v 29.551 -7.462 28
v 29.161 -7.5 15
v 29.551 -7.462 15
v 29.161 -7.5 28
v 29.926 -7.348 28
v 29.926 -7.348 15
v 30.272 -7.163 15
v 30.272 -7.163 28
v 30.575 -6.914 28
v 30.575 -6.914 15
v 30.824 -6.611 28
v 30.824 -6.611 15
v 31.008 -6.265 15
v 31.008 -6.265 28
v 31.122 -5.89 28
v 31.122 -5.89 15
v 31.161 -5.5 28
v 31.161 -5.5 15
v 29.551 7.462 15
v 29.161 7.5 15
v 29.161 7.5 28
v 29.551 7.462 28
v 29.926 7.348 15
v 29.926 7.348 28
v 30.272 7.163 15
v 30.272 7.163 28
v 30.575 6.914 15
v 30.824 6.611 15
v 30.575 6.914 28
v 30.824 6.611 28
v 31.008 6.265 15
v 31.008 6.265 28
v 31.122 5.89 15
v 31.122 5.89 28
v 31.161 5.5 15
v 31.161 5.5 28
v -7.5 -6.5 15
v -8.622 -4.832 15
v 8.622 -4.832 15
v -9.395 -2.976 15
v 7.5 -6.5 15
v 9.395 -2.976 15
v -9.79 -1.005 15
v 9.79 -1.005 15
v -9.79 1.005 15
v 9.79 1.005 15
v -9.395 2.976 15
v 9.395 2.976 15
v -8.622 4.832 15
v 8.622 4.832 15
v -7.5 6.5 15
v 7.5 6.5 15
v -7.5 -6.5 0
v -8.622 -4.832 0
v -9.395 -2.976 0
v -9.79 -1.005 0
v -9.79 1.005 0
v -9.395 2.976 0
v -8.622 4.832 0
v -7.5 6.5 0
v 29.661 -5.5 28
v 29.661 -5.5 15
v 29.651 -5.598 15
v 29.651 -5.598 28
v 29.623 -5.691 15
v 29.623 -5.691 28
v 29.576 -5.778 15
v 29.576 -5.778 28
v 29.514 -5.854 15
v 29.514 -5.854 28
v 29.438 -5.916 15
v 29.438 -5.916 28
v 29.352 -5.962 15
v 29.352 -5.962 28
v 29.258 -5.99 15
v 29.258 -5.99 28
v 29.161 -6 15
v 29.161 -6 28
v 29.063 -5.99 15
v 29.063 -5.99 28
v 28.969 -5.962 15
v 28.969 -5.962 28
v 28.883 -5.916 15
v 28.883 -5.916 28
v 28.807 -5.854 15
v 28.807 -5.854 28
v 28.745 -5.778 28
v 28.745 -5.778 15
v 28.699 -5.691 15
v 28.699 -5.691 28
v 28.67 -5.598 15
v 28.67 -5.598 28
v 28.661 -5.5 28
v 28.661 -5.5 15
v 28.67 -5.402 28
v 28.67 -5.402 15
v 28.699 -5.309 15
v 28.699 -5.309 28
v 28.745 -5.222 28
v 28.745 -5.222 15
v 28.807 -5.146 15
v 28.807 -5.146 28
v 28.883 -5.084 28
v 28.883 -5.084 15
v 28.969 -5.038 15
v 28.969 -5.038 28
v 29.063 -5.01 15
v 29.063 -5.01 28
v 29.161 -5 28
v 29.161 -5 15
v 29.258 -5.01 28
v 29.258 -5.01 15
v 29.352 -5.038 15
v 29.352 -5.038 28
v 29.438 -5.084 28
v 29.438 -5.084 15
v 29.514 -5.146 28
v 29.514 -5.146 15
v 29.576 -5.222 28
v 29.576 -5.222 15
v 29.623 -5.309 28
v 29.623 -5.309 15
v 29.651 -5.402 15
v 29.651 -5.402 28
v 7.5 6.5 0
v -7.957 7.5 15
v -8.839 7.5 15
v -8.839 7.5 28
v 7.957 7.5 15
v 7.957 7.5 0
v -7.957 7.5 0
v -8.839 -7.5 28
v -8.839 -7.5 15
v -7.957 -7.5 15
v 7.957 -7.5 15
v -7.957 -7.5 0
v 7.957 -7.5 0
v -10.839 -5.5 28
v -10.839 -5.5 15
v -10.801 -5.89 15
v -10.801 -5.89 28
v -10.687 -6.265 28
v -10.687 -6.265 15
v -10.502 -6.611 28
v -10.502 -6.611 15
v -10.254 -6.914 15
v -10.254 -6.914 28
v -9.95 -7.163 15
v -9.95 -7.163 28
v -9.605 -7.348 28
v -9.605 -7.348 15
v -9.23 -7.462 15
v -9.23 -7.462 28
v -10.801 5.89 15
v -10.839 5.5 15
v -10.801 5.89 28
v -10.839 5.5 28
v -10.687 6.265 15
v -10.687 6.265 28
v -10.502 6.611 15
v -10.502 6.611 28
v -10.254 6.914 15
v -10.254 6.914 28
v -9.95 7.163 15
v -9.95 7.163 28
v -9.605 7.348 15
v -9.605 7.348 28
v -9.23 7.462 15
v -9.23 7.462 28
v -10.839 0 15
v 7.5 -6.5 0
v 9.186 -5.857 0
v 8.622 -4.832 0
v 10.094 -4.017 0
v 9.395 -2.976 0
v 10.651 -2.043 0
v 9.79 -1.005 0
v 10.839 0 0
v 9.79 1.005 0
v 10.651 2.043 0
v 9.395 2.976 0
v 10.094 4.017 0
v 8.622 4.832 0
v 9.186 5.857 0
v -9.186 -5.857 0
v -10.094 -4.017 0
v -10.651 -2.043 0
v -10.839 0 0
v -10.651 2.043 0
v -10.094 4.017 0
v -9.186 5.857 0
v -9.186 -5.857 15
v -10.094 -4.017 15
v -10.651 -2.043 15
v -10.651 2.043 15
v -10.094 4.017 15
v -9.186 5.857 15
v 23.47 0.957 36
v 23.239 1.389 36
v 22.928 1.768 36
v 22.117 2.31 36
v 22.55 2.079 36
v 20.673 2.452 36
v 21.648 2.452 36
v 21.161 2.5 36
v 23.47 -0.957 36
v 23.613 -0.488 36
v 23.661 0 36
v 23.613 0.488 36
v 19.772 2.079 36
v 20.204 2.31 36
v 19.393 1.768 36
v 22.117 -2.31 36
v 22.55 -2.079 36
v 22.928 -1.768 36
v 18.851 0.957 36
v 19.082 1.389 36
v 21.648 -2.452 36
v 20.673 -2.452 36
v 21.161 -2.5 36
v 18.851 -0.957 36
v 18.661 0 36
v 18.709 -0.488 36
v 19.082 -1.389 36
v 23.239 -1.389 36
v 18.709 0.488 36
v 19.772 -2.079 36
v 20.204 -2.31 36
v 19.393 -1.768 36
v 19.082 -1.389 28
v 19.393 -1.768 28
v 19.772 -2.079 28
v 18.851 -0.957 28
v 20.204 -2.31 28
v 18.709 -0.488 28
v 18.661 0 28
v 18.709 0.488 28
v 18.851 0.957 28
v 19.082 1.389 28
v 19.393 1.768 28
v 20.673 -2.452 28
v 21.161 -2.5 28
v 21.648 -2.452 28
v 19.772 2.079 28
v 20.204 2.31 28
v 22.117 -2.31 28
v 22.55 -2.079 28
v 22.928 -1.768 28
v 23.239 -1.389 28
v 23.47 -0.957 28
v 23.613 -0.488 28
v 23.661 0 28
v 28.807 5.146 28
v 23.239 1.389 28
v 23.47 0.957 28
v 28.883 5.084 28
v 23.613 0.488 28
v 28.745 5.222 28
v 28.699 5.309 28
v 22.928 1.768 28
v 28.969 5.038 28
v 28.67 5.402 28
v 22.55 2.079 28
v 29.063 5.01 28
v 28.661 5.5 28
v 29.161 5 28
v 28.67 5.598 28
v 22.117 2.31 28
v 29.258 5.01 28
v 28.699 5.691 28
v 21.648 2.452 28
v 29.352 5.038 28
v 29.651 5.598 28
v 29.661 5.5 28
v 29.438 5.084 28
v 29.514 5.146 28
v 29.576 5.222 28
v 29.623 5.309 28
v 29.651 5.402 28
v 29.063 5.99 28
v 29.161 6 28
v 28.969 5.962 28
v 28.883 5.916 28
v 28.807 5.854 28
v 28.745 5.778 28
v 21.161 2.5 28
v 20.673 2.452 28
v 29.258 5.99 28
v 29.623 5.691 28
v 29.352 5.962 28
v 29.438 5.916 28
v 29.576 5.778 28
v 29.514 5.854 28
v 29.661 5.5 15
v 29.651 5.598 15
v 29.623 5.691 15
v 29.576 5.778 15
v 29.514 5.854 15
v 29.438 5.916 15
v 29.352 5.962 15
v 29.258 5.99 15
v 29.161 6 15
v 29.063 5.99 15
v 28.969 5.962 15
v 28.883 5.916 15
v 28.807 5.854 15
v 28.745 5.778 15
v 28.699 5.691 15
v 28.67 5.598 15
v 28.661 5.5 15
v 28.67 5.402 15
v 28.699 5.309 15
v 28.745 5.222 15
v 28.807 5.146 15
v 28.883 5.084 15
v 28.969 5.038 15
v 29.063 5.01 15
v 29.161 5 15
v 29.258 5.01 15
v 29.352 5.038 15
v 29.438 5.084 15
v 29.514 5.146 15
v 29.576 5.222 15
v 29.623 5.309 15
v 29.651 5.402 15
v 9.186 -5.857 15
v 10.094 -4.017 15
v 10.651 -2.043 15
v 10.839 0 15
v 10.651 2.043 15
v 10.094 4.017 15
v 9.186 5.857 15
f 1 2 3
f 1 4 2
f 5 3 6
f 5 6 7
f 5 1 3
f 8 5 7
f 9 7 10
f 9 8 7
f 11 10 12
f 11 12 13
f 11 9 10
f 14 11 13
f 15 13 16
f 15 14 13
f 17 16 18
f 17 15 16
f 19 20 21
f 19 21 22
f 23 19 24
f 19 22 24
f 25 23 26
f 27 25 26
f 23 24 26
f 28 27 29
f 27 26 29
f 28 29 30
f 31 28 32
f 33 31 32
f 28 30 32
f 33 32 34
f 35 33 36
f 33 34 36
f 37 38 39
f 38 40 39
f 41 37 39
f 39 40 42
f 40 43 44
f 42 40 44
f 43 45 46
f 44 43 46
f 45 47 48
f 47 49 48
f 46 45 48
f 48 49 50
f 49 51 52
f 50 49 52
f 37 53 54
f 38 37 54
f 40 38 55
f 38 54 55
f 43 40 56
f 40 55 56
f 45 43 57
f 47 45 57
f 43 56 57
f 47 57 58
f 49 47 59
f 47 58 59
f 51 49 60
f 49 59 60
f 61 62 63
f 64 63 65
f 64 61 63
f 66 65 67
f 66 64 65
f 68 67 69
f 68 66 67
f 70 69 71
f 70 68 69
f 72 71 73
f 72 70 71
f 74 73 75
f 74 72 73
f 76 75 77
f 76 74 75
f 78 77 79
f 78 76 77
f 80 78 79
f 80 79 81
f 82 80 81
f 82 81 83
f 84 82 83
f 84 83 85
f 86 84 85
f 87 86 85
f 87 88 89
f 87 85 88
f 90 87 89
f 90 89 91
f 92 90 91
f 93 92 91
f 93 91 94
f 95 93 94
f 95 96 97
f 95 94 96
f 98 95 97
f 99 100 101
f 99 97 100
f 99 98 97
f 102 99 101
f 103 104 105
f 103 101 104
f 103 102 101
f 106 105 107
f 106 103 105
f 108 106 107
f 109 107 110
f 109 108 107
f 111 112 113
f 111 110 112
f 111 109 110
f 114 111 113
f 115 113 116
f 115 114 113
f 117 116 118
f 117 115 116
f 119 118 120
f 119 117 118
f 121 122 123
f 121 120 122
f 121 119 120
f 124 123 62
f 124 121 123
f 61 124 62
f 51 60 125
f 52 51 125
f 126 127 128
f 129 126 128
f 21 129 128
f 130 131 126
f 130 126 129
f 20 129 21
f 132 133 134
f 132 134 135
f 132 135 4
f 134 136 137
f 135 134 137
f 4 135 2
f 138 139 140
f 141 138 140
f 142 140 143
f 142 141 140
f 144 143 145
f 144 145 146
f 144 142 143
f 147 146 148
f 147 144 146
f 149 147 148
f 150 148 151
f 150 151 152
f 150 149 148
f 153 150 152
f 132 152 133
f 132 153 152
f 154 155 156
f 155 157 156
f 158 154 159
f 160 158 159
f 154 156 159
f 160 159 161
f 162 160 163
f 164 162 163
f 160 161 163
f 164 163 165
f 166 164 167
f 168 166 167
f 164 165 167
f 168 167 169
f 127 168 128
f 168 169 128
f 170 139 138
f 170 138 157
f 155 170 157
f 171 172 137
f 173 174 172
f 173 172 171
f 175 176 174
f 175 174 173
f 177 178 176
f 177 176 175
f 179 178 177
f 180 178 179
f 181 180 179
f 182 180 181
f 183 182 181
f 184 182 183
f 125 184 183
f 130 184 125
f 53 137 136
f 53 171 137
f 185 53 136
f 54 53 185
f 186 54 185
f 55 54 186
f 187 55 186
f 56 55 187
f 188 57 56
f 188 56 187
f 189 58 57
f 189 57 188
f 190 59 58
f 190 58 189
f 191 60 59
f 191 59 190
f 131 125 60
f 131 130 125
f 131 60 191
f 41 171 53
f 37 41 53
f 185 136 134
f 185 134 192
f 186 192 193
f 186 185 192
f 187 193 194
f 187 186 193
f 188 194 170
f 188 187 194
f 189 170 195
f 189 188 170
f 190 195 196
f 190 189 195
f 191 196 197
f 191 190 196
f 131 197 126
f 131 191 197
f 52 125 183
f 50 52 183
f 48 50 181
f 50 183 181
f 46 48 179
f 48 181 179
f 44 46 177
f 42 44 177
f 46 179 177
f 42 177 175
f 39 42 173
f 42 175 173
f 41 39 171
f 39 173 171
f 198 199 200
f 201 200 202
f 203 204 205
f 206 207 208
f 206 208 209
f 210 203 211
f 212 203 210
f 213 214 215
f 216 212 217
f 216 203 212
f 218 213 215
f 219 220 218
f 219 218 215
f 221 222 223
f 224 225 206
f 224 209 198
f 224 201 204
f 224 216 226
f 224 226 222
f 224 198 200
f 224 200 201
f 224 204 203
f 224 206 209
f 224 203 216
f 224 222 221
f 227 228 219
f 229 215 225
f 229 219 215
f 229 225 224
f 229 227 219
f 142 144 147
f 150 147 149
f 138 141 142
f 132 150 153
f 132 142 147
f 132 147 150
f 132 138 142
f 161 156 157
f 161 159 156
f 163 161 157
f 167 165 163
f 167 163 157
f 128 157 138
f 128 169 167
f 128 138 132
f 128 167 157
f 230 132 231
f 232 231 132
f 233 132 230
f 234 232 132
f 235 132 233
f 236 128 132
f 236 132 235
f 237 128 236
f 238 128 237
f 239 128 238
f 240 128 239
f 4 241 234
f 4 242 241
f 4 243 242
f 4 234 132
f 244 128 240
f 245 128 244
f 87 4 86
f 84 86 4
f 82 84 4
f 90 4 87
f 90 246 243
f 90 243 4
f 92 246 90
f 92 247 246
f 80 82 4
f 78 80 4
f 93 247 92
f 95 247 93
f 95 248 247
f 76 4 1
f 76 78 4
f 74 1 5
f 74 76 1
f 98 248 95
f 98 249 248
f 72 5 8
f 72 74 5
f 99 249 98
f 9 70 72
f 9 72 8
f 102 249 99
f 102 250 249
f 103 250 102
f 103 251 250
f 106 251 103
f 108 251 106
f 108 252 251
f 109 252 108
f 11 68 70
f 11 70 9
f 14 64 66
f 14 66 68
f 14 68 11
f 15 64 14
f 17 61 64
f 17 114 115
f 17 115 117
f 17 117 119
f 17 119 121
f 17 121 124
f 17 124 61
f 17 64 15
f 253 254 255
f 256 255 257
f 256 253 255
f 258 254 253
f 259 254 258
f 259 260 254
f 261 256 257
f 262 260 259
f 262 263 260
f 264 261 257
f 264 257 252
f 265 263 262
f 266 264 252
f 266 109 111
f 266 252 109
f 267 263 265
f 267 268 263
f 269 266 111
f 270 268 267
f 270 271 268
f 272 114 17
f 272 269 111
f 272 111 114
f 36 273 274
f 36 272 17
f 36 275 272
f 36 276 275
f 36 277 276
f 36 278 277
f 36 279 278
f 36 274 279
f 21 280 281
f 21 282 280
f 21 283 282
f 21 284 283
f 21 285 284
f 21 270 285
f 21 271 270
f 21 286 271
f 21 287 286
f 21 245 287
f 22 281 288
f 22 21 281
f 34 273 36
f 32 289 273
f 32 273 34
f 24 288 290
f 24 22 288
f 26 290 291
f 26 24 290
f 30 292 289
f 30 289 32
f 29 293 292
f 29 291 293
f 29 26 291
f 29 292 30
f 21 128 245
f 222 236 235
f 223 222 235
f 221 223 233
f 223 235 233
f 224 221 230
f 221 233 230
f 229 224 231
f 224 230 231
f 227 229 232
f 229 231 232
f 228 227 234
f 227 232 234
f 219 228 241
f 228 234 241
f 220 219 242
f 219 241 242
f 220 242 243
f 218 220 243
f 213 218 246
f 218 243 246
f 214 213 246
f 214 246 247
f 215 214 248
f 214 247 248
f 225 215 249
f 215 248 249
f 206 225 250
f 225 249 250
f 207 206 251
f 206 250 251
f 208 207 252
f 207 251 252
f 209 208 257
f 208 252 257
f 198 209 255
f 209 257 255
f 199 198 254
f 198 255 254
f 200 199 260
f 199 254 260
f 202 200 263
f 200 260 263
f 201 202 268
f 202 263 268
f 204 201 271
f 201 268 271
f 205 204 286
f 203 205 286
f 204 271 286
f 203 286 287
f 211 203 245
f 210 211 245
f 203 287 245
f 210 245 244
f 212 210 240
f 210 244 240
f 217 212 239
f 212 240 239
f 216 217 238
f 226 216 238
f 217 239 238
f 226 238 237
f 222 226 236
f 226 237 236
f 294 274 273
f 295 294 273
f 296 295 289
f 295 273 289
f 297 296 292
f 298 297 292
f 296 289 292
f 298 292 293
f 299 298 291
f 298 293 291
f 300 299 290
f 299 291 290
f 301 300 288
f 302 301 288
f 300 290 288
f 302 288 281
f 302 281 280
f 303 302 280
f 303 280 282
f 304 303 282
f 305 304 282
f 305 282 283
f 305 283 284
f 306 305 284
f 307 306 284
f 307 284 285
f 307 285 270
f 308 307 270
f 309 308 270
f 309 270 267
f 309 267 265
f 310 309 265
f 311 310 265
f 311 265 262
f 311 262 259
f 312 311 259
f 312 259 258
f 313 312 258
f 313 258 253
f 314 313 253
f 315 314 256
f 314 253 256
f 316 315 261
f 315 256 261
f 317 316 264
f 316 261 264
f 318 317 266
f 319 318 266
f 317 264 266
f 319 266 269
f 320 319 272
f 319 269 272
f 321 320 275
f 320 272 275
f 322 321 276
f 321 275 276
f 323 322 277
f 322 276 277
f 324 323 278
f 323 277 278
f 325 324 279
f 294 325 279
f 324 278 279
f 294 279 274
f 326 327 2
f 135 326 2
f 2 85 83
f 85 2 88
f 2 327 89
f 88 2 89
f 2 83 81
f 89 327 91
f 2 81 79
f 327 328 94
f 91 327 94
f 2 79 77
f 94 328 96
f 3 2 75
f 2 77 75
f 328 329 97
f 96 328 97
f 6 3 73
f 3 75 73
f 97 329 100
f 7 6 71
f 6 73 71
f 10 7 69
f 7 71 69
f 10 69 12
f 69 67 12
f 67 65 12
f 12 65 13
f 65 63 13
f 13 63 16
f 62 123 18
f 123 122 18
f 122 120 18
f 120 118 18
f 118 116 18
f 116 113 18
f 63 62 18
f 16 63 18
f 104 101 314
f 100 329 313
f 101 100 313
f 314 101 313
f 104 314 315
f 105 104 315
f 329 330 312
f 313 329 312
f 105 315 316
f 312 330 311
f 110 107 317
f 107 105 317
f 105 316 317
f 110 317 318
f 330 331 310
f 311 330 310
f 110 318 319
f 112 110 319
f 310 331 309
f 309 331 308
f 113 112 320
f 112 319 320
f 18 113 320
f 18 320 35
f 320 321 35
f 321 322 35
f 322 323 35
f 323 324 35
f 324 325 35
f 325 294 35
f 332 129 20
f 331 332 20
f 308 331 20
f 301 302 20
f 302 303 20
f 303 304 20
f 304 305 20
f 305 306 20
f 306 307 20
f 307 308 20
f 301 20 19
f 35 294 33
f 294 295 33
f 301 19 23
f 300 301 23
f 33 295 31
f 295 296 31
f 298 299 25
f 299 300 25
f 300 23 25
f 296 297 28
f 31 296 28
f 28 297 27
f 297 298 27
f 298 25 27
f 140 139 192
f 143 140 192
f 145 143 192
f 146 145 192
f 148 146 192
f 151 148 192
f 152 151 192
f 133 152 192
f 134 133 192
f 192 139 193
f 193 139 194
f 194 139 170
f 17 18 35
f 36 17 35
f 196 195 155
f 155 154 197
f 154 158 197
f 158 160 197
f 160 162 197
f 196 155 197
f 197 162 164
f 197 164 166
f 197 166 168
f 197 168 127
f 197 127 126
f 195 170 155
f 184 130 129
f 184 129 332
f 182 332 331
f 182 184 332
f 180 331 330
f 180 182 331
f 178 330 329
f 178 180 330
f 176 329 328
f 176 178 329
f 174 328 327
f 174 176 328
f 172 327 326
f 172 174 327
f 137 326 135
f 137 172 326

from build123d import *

# Parameters (mm, degrees)
BOSS_EXTRUDE1_DEPTH = 15
SKETCH2_W           = 42
SKETCH2_H           = 15
BOSS_EXTRUDE2_DEPTH = 13
FILLET1_R           = 2
SKETCH3_R           = 2.5
BOSS_EXTRUDE3_DEPTH = 8
SKETCH4_R           = 0.5
CUT_EXTRUDE1_DEPTH  = 43.558628129


with BuildPart() as part:
    # Sketch1 → Boss-Extrude1 (new body)
    with BuildSketch(Plane.XY):
        with BuildLine():
            ThreePointArc((7.957391107, 7.5), (10.83933845, 0), (7.957391107, -7.5))
            Line((7.957391107, -7.5), (-7.957391107, -7.5))
            ThreePointArc((-7.957391107, -7.5), (-10.83933845, 0), (-7.957391107, 7.5))
            Line((-7.957391107, 7.5), (7.957391107, 7.5))
        make_face()
        with BuildLine():
            Line((-7.5, 6.5), (7.5, 6.5))
            ThreePointArc((7.5, 6.5), (9.83933845, 0), (7.5, -6.5))
            Line((7.5, -6.5), (-7.5, -6.5))
            ThreePointArc((-7.5, -6.5), (-9.83933845, 0), (-7.5, 6.5))
        make_face(mode=Mode.SUBTRACT)
    extrude(amount=BOSS_EXTRUDE1_DEPTH)

    # Sketch2 → Boss-Extrude2 (add)
    with BuildSketch(Plane.XY.offset(15)):
        with Locations((10.16066155, 0)):
            Rectangle(SKETCH2_W, SKETCH2_H)
    extrude(amount=BOSS_EXTRUDE2_DEPTH)

    # Fillet1
    fillet1_edges = [part.edges().sort_by_distance(p)[0] for p in [
        (31.16066155, 7.5, 21.5),
        (-10.83933845, 7.5, 21.5),
        (-10.83933845, -7.5, 21.5),
        (31.16066155, -7.5, 21.5),
    ]]
    fillet(fillet1_edges, radius=FILLET1_R)

    # Sketch3 → Boss-Extrude3 (add)
    with BuildSketch(Plane.XY.offset(28)):
        with Locations(Location((21.16066155, 0, 0), (0, 0, 180))):
            Circle(SKETCH3_R)
    extrude(amount=BOSS_EXTRUDE3_DEPTH)

    # Sketch4 → Cut-Extrude1 (cut, through all)
    with BuildSketch(Plane.XY.offset(28)):
        with Locations((29.16066155, 5.5)):
            Circle(SKETCH4_R)
    cut_extrude1 = extrude(amount=-CUT_EXTRUDE1_DEPTH, mode=Mode.SUBTRACT)

    # Mirror1: Cut-Extrude1 across plane
    add(cut_extrude1.mirror(Plane.ZX), mode=Mode.SUBTRACT)


solid = part.part
